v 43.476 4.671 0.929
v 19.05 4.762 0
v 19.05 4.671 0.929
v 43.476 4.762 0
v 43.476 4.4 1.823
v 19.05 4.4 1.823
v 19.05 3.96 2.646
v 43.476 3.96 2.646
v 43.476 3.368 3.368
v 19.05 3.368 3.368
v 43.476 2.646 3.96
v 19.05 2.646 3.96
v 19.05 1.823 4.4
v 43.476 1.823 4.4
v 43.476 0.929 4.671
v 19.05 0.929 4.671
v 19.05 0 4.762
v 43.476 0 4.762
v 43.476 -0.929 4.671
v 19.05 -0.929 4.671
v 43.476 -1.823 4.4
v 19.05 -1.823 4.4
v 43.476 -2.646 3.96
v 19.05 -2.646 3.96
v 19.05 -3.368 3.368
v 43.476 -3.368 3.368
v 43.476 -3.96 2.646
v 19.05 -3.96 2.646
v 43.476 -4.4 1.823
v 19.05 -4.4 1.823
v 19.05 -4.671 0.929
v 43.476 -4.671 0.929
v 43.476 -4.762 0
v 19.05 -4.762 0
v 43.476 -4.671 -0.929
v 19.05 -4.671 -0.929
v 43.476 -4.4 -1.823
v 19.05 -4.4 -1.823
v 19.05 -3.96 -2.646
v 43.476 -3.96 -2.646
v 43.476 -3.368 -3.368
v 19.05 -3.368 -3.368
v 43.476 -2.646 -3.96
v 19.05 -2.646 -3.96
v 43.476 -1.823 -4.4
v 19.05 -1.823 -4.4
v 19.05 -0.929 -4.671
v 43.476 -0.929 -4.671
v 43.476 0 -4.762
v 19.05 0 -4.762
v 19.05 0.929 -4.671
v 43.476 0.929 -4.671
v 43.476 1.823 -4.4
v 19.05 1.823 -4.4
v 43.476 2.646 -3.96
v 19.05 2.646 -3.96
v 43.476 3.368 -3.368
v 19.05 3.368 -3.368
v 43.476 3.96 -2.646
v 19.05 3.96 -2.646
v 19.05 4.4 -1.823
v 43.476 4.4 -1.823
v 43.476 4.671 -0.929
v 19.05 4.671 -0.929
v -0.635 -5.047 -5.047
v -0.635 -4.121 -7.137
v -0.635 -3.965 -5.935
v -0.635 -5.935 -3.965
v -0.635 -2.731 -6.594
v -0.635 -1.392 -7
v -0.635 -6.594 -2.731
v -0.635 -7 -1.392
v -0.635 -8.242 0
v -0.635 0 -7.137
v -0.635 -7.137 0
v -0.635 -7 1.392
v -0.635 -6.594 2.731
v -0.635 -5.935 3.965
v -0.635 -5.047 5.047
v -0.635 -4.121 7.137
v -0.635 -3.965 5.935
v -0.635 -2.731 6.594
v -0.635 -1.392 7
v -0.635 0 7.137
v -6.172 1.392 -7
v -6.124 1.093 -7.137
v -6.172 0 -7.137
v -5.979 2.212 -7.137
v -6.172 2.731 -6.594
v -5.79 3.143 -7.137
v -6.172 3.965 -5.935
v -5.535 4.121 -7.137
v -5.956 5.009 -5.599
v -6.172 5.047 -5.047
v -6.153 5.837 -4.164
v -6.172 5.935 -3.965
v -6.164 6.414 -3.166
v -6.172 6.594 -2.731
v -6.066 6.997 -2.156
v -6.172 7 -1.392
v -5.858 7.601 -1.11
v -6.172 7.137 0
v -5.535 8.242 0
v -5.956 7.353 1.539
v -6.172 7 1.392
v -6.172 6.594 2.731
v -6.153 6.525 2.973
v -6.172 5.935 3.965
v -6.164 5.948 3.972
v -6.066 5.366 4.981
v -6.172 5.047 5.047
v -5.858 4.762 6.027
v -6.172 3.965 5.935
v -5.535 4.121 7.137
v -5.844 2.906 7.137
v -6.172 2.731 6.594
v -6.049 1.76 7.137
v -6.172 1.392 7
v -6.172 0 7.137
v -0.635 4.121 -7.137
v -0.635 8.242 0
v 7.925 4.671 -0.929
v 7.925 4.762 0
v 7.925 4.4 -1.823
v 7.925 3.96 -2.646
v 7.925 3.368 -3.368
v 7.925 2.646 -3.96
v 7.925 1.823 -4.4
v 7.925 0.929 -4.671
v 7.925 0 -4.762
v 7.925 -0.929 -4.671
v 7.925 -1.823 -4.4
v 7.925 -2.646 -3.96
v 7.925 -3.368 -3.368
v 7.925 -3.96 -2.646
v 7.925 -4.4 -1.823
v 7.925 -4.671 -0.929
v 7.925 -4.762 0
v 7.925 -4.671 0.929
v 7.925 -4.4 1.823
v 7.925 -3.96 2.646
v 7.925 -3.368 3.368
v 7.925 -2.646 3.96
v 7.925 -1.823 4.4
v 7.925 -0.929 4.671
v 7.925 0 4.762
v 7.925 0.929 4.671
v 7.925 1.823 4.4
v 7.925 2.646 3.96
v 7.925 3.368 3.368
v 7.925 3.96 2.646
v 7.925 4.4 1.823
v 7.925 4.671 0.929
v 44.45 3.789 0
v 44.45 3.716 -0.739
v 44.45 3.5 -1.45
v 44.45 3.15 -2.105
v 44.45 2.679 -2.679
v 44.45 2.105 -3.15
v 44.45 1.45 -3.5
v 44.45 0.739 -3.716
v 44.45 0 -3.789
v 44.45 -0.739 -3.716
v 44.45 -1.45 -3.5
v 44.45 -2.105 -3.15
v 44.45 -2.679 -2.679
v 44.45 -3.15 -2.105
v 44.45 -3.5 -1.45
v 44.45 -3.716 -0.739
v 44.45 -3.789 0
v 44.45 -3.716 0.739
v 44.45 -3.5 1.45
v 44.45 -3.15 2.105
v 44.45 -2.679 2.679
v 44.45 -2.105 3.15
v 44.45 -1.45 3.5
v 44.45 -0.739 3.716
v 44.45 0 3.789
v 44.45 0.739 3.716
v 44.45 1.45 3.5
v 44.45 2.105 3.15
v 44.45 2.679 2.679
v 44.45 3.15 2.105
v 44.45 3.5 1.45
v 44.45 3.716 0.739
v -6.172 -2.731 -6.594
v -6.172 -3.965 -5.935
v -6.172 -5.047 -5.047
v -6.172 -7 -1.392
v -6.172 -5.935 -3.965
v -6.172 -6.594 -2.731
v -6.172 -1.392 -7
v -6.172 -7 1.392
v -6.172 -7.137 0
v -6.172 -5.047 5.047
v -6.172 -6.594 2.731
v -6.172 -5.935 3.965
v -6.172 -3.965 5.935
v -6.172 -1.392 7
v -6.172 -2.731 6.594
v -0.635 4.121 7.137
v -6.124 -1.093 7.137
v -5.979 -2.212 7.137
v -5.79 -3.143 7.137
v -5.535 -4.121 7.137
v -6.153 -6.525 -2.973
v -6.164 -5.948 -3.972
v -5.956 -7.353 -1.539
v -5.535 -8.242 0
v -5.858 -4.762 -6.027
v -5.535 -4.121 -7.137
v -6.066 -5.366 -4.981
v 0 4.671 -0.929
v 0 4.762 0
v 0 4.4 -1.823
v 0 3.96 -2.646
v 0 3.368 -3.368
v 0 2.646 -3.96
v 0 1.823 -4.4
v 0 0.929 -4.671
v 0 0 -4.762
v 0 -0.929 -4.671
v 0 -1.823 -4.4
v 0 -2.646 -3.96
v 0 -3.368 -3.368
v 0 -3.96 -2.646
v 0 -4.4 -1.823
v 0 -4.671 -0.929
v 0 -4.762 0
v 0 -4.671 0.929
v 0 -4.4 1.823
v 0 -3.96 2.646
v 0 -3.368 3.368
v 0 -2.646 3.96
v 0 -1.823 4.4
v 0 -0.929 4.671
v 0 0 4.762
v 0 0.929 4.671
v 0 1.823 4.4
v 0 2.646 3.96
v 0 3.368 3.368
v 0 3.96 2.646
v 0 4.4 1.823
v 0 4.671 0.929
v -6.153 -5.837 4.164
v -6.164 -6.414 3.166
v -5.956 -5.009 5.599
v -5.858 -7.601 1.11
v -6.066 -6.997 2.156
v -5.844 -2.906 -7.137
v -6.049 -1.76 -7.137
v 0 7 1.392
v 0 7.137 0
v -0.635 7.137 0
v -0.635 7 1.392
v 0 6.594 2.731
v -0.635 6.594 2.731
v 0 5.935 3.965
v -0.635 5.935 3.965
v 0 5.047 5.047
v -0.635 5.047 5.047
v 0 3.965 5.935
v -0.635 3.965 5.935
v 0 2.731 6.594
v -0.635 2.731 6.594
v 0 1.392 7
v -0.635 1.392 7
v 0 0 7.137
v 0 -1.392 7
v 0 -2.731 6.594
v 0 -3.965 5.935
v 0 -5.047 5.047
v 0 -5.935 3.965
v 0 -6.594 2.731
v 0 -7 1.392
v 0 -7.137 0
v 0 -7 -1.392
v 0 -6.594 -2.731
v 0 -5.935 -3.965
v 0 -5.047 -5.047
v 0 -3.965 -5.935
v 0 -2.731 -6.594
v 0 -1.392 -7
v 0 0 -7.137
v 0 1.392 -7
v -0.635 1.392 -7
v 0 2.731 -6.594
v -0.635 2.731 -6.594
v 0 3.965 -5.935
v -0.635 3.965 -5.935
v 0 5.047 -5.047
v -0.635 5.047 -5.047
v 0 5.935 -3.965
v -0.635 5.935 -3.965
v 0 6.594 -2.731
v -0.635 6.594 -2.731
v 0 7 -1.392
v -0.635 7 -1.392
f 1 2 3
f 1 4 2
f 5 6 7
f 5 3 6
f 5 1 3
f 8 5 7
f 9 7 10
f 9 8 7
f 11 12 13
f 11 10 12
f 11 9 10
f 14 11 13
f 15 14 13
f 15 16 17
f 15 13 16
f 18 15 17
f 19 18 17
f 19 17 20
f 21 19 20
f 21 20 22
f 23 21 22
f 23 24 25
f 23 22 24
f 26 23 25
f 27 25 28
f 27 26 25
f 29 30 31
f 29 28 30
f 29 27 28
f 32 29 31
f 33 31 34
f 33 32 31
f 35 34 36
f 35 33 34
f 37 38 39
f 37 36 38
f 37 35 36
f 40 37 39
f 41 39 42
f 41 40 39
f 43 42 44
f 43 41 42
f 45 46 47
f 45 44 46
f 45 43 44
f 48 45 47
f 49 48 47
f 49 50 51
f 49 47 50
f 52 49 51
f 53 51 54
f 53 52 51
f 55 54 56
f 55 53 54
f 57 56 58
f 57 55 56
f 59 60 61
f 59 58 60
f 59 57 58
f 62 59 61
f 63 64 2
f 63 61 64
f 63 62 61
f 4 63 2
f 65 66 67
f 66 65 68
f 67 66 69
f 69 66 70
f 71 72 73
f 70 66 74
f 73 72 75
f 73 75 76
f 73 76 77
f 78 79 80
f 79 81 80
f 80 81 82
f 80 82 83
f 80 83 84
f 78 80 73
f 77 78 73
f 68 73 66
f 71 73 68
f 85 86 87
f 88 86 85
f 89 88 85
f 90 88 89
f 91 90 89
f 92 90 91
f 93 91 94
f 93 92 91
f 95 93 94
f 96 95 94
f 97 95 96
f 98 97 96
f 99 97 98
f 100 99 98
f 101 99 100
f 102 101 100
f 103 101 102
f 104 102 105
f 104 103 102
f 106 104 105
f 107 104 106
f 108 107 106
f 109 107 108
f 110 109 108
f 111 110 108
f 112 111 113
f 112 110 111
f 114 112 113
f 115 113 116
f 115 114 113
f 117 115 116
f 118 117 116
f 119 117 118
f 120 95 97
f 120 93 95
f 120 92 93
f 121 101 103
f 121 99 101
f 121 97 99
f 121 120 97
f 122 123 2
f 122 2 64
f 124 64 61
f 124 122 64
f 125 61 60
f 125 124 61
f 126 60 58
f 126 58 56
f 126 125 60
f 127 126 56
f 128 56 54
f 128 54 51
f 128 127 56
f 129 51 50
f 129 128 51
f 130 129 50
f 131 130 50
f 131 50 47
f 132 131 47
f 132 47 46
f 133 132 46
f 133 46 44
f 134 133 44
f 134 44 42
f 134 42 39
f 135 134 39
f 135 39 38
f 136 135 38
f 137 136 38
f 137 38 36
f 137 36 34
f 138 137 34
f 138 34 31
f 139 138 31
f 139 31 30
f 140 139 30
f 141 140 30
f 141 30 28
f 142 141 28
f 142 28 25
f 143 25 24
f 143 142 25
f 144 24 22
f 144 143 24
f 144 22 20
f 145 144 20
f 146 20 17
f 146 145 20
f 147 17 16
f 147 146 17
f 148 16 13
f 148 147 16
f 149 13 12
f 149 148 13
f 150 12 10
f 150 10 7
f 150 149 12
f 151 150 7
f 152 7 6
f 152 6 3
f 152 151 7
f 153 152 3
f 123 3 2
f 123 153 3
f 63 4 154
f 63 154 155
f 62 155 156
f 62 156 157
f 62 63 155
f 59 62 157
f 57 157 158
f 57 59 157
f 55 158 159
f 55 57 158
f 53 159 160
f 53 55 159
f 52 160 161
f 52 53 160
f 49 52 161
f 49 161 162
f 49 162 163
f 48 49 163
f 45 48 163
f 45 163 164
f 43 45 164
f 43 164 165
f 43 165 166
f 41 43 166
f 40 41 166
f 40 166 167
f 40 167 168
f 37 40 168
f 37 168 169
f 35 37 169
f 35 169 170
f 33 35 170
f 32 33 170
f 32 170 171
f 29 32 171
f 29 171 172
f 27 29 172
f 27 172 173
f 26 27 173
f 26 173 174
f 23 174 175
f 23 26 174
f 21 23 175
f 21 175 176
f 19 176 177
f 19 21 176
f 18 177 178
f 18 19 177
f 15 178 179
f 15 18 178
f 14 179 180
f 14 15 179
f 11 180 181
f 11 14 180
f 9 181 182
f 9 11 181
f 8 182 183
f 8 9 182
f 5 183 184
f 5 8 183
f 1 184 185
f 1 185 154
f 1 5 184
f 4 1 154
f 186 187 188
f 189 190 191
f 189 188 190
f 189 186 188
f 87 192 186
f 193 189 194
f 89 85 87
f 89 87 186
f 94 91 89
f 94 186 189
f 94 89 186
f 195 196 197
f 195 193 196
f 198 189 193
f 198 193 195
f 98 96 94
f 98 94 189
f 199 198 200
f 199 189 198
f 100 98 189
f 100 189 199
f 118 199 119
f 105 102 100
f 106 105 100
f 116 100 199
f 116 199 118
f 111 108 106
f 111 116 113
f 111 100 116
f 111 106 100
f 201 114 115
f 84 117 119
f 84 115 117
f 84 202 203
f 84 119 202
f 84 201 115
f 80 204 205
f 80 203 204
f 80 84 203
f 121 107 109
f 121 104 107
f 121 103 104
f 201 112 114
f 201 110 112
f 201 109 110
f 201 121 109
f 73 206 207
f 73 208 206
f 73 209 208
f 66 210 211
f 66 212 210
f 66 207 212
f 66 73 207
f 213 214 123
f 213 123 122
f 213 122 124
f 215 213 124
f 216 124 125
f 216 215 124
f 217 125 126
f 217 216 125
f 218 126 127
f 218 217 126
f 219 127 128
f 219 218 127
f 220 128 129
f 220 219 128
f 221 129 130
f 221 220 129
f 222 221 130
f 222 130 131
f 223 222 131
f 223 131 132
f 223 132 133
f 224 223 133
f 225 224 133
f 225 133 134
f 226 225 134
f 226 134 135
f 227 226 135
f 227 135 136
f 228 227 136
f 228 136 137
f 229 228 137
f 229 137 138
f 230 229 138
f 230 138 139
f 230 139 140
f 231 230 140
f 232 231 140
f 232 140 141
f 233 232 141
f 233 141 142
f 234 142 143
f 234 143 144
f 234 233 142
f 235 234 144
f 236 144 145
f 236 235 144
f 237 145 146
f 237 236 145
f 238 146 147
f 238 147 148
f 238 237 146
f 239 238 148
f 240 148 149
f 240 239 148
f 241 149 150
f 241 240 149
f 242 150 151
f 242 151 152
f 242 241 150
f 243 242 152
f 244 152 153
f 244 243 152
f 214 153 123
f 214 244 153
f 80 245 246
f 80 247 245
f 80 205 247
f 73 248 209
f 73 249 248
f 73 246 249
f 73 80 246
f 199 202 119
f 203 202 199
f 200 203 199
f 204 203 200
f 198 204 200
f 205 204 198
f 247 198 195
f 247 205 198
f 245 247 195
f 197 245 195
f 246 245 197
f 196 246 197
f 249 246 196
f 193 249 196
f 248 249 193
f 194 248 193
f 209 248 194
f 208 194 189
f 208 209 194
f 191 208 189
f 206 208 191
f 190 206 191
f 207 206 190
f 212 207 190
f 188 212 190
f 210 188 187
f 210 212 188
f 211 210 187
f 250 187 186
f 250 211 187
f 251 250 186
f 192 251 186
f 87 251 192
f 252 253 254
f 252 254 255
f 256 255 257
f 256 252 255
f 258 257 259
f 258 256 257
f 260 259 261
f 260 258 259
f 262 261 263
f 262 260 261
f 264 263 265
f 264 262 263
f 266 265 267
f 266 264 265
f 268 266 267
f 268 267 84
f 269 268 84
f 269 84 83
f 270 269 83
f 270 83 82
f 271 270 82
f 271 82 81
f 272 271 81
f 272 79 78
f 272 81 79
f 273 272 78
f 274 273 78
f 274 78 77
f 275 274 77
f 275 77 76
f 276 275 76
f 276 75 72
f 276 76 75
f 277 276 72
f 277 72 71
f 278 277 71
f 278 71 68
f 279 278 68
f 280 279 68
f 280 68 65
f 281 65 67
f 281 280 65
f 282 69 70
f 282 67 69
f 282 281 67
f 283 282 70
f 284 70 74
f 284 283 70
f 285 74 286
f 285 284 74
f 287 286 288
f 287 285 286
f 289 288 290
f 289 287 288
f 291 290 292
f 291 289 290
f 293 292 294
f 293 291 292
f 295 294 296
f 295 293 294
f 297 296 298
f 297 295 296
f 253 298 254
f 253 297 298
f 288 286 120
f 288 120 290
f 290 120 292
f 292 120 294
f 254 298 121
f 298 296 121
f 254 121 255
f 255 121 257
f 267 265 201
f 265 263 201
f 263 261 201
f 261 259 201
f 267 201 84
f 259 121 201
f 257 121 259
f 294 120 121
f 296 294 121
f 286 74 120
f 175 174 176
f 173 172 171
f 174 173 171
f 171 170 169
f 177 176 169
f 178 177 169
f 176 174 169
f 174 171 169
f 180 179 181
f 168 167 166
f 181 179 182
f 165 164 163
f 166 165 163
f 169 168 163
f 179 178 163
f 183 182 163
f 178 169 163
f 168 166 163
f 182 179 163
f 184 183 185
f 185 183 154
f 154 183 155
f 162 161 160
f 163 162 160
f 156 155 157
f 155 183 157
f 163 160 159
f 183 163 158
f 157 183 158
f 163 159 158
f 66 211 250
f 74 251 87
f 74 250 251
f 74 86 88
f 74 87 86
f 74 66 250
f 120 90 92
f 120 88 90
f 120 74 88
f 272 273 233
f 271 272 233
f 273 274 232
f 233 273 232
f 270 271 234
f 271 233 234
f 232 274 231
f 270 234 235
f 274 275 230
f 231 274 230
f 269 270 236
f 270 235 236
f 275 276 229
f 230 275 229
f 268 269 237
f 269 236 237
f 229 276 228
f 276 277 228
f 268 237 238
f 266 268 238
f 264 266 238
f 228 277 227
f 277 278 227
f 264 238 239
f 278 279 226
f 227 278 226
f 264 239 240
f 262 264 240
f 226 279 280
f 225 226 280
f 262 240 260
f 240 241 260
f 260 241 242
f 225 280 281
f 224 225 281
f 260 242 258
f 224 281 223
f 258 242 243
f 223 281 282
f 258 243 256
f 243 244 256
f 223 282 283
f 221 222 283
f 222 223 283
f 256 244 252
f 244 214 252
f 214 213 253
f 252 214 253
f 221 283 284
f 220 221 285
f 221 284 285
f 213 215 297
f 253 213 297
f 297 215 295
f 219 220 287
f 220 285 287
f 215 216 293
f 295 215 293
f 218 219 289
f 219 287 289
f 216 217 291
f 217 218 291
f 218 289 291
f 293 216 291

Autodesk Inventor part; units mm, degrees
ref_plane "YZ Plane" through (0, 0, 0) normal (1, 0, 0) x (0, 1, 0)
ref_plane "XZ Plane" through (0, 0, 0) normal (0, 1, 0) x (-1, 0, 0)
sketch "Sketch1" plane through (0, 0, 0) normal (0, 0, 1) x (1, 0, 0)
  line L0 (0, 7.1374) -> (0, 4.7625)
  line L1 (19.05, 4.7625) -> (44.45, 4.7625)
  line L2 (44.45, 4.7625) -> (44.45, 0)
  line L3 (44.45, 0) -> (-0.6351, 0)
  line L4 (-9.6521, 0) -> (53.467, 0) projected
  line L5 (-0.6351, 0) -> (-0.6351, 7.1374)
  line L6 (-0.6351, 7.1374) -> (0, 7.1374)
  line L7 (19.05, 4.7625) -> (7.9247, 4.7625)
  line L8 (7.9247, 4.7625) -> (0, 4.7625)
  line L9 (0, -1.4275) -> (0, 8.5649) projected
  dimension "d0" = 44.45
  dimension "d1" = 25.4
  dimension "d2" = 9.525
  dimension "d9" = 0.6351
  dimension "d10" = 14.2748
  dimension "d13" = 11.1253
  dimension "d14" = 9.525
revolve "Body" add sketch "Sketch1" angle 360 about axis through (44.45, 0, 0) along (-1, 0, 0)
sketch "Sketch2" plane through (-0.6351, 0, 0) normal (-1, 0, 0) x (0, 0, 1)
  line L0 (0, 8.2416) -> (7.1374, 4.1208)
  line L1 (7.1374, 4.1208) -> (7.1374, -4.1208)
  line L2 (7.1374, -4.1208) -> (0, -8.2416)
  line L3 (0, -8.2416) -> (-7.1374, -4.1208)
  line L4 (-7.1374, -4.1208) -> (-7.1374, 4.1208)
  line L5 (-7.1374, 4.1208) -> (0, 8.2416)
  point P0 (0, 0)
  point P1 (0, 0)
  dimension "d11" = 14.2748
extrude "Head" add sketch "Sketch2" along normal blind 5.5372
sketch "Sketch4" plane through (0, 0, 0) normal (0, 0, 1) x (1, 0, 0)
  line L0 (-6.1723, 7.1374) -> (-6.1723, 8.2416)
  line L1 (-6.1723, 8.2416) -> (-5.5348, 8.2416)
  line L2 (-5.5348, 8.2416) -> (-6.1723, 7.1374)
  line L3 (-7.2797, 0) -> (0.4723, 0) projected
  line L4 (-0.6351, 8.2416) -> (-6.1723, 8.2416) projected
  line L5 (-6.1723, 4.1208) -> (-6.1723, 8.2416) projected
  dimension "d5" = 30
  dimension "d19" = 14.2748
revolve "Chamfer1" cut sketch "Sketch4" angle 360 about axis through (-10, 0, 0) along (1, 0, 0)
thread "Thread" size "3/8-16 UNC" class "2A" standard "ANSI Unified Screw Threads" length 25.4
chamfer "Chamfer2" distance 0.9738 distance2 0.9739 1 edges at (44.45, -4.7625, 0) measured on face at (44.45, -1.2549, 0.1261)
ref_plane "Work Plane1" through (1.525, 0, 0) normal (0, 0, 1) x (1, 0, 0)
equation "\"d0\" = NLG"
equation "\"d1\" = GEL"
equation "\"d2\" = GD"
equation "\"d10\" = SD2"
equation "\"d14\" = BDM"
equation "\"d11\" = SW"
equation "\"d3\" = KOH - SD"
equation "\"d5\" = ANG1"
equation "\"d19\" = SW0"
equation "\"d15\" = GEL"
equation "\"d6\" = -0.5 * SPD + 0.5 * GD"
equation "\"NLG\" = 44.45"
equation "\"GD\" = 9.525"
equation "\"BDM\" = 9.525"
equation "\"KOH\" = 6.1722"
equation "\"GEL\" = 25.4"
equation "\"SW\" = 14.2748"
equation "\"SW0\" = SW"
equation "\"SPD\" = GD1"
equation "\"SD2\" = SW"
equation "\"SD\" = 0.635"
equation "\"ANG1\" = 30deg"
equation "\"GAL\" = 11.1252"
equation "\"GUL\" = 0.97384"
equation "\"RR\" = 0.381"
equation "\"WFT\" = SD"
equation "\"GD1\" = 7.57733"
equation "\"THREADDIA\" = 9.525"
equation "\"SDH\" = SW"
equation "\"SDHG\" = 7.9248"
equation "\"TOA\" = 30deg"
equation "\"FAWI\" = 45deg"
equation "\"NND\" = 9.525"
equation "\"E0\" = 16.48739"
properties part number "AS 2465 - 3/8 x 1 3/4  UNC" material "Steel, Mild"
